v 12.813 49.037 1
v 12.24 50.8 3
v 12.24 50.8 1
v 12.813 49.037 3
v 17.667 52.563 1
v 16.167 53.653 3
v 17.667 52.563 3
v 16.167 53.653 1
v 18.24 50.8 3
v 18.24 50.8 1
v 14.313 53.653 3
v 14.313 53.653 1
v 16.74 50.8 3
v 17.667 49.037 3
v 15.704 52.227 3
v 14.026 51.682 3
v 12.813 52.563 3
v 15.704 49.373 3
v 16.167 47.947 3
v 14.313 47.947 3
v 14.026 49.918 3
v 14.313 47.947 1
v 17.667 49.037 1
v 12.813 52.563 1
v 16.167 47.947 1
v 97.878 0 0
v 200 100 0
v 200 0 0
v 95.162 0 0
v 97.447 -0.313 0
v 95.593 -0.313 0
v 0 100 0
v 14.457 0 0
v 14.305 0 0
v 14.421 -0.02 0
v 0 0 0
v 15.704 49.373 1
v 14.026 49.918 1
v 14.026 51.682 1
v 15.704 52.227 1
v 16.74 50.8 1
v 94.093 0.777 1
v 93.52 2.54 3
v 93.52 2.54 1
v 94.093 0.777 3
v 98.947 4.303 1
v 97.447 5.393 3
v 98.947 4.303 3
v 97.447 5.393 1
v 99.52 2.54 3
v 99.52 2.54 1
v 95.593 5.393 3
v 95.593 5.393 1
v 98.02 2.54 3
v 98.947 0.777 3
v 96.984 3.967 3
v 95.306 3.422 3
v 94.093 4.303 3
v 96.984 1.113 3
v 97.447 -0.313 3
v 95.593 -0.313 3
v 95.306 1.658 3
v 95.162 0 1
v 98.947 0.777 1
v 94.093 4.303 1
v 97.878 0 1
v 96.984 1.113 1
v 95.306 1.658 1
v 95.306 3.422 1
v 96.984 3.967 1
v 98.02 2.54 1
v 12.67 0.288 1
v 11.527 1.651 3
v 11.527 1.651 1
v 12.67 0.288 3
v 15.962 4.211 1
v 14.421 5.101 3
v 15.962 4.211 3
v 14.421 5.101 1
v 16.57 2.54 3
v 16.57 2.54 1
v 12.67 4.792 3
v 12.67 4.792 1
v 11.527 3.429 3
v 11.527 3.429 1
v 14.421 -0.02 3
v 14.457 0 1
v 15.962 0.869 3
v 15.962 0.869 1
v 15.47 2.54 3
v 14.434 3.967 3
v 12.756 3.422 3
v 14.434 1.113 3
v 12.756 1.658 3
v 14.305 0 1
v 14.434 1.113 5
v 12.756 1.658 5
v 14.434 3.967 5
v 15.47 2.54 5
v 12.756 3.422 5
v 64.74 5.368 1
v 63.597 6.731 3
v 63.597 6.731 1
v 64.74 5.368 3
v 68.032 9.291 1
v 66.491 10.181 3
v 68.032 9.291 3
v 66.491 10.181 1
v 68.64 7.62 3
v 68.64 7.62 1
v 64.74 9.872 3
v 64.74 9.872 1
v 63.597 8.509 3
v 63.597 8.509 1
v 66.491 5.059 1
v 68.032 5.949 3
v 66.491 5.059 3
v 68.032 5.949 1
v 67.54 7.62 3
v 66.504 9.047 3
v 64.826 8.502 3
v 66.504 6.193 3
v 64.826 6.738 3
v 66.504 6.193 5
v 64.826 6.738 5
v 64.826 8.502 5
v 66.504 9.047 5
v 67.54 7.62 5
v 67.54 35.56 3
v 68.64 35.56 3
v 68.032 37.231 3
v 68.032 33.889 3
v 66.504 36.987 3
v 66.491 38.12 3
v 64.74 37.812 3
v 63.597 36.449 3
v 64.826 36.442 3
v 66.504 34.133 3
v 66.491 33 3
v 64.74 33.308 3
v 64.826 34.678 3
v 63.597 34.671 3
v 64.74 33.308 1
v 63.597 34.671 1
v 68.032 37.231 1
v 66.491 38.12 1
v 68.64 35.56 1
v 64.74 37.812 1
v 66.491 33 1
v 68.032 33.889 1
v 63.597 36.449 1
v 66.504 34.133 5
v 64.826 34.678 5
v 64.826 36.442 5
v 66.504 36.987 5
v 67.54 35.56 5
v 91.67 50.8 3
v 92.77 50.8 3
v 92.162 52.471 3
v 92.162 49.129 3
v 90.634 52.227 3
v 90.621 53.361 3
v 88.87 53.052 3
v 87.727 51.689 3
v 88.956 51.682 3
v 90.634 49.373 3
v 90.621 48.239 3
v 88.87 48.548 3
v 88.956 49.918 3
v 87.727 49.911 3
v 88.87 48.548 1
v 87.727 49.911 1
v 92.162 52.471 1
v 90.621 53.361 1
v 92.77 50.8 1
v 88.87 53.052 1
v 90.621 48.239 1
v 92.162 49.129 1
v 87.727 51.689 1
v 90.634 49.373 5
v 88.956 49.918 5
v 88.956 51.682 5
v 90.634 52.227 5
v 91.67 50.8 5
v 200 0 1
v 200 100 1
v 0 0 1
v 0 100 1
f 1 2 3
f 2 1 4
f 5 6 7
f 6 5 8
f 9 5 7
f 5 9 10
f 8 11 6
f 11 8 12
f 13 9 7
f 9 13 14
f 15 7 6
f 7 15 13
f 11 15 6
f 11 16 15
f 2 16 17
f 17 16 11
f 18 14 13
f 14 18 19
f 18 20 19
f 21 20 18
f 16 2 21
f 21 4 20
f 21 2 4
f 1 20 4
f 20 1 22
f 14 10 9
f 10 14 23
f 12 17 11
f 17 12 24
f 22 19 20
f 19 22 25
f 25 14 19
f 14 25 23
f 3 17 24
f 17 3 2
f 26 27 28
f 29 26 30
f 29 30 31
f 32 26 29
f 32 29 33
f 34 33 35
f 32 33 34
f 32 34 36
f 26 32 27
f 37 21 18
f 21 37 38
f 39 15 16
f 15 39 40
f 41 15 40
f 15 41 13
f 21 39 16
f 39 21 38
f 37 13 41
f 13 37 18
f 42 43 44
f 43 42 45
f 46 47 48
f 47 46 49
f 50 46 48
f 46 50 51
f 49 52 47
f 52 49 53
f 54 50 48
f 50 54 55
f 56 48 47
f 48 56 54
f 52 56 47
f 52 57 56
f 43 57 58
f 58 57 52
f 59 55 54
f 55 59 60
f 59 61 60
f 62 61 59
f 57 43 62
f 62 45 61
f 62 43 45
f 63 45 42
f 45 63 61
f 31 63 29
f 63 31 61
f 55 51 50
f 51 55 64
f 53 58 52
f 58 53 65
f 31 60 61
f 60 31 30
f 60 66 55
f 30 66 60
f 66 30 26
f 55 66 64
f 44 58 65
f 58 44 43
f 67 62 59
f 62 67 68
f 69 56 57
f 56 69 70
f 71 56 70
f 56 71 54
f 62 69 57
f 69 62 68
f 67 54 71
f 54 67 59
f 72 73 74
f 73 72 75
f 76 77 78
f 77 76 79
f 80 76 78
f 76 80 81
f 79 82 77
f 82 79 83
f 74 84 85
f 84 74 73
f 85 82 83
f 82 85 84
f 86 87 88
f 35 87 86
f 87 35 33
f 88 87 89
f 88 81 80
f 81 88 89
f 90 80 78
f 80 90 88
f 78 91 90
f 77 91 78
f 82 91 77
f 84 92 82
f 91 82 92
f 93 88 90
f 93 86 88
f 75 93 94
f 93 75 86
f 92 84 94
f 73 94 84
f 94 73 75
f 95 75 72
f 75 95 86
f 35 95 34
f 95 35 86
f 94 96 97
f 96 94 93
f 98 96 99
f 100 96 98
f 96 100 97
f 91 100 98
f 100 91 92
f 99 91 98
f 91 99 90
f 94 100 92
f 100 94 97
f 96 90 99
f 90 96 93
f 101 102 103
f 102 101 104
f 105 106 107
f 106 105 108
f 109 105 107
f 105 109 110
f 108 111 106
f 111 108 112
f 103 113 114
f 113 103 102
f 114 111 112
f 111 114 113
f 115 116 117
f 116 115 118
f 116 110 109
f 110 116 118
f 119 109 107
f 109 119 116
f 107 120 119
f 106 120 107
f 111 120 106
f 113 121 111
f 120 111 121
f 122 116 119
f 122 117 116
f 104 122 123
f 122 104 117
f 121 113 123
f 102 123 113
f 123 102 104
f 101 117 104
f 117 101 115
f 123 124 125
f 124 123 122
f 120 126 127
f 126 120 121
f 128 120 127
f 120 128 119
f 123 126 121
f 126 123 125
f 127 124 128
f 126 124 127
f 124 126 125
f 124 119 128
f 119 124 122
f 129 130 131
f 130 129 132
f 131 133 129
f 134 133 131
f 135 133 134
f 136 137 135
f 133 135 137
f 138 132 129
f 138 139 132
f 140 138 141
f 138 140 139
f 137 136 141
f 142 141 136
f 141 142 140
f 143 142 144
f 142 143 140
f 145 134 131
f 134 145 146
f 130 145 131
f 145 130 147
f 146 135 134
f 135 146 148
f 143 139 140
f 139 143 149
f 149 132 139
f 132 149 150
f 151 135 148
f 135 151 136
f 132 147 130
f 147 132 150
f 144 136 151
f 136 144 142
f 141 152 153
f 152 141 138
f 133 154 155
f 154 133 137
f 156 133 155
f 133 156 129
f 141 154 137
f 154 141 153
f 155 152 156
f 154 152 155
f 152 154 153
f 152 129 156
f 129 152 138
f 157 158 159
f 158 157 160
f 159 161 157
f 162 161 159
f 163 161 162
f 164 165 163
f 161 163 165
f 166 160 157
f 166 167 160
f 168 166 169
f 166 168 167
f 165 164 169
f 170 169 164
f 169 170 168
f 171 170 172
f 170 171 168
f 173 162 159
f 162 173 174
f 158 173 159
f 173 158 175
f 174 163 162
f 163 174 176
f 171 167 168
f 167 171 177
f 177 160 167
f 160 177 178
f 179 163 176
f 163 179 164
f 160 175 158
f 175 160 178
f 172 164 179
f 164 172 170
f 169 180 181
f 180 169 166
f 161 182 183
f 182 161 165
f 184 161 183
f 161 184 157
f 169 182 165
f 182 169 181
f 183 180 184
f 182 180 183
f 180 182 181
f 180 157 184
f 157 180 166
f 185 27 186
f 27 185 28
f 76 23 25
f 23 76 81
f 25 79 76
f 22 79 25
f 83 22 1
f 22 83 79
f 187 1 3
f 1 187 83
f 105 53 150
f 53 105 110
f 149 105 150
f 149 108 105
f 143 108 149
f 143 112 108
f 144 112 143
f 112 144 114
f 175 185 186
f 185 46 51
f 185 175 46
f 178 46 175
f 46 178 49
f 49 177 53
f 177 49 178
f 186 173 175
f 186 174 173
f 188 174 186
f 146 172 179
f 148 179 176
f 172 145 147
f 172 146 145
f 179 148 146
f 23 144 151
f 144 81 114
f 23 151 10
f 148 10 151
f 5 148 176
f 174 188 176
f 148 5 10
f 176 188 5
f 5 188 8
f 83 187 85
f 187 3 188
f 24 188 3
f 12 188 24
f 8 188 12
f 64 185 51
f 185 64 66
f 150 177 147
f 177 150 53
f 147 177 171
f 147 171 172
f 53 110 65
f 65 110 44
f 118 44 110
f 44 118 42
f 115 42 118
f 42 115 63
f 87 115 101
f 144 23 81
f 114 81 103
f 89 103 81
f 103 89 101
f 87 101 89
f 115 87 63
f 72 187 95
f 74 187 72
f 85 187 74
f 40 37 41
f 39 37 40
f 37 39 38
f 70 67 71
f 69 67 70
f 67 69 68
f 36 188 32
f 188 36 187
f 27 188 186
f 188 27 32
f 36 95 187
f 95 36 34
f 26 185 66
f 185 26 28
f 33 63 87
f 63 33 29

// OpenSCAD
// RAMPS mount
for ( p = [
            [15.24, 50.80, 0],
            [96.52,  2.54, 0],
          ])
{
    translate(p) difference() {
        cylinder(h=3, r=3);
        cylinder(h=5, r=1.5);
    }
}

for ( p = [
            [13.97,  2.54, 0],
            [66.04,  7.62, 0],
            [66.04, 35.56, 0],
            [90.17, 50.80, 0]
          ])
{
    translate(p) cylinder(h=3, r=2.6);
    translate(p) cylinder(h=5, r=1.5);
}




cube(size=[200,100,1]);
